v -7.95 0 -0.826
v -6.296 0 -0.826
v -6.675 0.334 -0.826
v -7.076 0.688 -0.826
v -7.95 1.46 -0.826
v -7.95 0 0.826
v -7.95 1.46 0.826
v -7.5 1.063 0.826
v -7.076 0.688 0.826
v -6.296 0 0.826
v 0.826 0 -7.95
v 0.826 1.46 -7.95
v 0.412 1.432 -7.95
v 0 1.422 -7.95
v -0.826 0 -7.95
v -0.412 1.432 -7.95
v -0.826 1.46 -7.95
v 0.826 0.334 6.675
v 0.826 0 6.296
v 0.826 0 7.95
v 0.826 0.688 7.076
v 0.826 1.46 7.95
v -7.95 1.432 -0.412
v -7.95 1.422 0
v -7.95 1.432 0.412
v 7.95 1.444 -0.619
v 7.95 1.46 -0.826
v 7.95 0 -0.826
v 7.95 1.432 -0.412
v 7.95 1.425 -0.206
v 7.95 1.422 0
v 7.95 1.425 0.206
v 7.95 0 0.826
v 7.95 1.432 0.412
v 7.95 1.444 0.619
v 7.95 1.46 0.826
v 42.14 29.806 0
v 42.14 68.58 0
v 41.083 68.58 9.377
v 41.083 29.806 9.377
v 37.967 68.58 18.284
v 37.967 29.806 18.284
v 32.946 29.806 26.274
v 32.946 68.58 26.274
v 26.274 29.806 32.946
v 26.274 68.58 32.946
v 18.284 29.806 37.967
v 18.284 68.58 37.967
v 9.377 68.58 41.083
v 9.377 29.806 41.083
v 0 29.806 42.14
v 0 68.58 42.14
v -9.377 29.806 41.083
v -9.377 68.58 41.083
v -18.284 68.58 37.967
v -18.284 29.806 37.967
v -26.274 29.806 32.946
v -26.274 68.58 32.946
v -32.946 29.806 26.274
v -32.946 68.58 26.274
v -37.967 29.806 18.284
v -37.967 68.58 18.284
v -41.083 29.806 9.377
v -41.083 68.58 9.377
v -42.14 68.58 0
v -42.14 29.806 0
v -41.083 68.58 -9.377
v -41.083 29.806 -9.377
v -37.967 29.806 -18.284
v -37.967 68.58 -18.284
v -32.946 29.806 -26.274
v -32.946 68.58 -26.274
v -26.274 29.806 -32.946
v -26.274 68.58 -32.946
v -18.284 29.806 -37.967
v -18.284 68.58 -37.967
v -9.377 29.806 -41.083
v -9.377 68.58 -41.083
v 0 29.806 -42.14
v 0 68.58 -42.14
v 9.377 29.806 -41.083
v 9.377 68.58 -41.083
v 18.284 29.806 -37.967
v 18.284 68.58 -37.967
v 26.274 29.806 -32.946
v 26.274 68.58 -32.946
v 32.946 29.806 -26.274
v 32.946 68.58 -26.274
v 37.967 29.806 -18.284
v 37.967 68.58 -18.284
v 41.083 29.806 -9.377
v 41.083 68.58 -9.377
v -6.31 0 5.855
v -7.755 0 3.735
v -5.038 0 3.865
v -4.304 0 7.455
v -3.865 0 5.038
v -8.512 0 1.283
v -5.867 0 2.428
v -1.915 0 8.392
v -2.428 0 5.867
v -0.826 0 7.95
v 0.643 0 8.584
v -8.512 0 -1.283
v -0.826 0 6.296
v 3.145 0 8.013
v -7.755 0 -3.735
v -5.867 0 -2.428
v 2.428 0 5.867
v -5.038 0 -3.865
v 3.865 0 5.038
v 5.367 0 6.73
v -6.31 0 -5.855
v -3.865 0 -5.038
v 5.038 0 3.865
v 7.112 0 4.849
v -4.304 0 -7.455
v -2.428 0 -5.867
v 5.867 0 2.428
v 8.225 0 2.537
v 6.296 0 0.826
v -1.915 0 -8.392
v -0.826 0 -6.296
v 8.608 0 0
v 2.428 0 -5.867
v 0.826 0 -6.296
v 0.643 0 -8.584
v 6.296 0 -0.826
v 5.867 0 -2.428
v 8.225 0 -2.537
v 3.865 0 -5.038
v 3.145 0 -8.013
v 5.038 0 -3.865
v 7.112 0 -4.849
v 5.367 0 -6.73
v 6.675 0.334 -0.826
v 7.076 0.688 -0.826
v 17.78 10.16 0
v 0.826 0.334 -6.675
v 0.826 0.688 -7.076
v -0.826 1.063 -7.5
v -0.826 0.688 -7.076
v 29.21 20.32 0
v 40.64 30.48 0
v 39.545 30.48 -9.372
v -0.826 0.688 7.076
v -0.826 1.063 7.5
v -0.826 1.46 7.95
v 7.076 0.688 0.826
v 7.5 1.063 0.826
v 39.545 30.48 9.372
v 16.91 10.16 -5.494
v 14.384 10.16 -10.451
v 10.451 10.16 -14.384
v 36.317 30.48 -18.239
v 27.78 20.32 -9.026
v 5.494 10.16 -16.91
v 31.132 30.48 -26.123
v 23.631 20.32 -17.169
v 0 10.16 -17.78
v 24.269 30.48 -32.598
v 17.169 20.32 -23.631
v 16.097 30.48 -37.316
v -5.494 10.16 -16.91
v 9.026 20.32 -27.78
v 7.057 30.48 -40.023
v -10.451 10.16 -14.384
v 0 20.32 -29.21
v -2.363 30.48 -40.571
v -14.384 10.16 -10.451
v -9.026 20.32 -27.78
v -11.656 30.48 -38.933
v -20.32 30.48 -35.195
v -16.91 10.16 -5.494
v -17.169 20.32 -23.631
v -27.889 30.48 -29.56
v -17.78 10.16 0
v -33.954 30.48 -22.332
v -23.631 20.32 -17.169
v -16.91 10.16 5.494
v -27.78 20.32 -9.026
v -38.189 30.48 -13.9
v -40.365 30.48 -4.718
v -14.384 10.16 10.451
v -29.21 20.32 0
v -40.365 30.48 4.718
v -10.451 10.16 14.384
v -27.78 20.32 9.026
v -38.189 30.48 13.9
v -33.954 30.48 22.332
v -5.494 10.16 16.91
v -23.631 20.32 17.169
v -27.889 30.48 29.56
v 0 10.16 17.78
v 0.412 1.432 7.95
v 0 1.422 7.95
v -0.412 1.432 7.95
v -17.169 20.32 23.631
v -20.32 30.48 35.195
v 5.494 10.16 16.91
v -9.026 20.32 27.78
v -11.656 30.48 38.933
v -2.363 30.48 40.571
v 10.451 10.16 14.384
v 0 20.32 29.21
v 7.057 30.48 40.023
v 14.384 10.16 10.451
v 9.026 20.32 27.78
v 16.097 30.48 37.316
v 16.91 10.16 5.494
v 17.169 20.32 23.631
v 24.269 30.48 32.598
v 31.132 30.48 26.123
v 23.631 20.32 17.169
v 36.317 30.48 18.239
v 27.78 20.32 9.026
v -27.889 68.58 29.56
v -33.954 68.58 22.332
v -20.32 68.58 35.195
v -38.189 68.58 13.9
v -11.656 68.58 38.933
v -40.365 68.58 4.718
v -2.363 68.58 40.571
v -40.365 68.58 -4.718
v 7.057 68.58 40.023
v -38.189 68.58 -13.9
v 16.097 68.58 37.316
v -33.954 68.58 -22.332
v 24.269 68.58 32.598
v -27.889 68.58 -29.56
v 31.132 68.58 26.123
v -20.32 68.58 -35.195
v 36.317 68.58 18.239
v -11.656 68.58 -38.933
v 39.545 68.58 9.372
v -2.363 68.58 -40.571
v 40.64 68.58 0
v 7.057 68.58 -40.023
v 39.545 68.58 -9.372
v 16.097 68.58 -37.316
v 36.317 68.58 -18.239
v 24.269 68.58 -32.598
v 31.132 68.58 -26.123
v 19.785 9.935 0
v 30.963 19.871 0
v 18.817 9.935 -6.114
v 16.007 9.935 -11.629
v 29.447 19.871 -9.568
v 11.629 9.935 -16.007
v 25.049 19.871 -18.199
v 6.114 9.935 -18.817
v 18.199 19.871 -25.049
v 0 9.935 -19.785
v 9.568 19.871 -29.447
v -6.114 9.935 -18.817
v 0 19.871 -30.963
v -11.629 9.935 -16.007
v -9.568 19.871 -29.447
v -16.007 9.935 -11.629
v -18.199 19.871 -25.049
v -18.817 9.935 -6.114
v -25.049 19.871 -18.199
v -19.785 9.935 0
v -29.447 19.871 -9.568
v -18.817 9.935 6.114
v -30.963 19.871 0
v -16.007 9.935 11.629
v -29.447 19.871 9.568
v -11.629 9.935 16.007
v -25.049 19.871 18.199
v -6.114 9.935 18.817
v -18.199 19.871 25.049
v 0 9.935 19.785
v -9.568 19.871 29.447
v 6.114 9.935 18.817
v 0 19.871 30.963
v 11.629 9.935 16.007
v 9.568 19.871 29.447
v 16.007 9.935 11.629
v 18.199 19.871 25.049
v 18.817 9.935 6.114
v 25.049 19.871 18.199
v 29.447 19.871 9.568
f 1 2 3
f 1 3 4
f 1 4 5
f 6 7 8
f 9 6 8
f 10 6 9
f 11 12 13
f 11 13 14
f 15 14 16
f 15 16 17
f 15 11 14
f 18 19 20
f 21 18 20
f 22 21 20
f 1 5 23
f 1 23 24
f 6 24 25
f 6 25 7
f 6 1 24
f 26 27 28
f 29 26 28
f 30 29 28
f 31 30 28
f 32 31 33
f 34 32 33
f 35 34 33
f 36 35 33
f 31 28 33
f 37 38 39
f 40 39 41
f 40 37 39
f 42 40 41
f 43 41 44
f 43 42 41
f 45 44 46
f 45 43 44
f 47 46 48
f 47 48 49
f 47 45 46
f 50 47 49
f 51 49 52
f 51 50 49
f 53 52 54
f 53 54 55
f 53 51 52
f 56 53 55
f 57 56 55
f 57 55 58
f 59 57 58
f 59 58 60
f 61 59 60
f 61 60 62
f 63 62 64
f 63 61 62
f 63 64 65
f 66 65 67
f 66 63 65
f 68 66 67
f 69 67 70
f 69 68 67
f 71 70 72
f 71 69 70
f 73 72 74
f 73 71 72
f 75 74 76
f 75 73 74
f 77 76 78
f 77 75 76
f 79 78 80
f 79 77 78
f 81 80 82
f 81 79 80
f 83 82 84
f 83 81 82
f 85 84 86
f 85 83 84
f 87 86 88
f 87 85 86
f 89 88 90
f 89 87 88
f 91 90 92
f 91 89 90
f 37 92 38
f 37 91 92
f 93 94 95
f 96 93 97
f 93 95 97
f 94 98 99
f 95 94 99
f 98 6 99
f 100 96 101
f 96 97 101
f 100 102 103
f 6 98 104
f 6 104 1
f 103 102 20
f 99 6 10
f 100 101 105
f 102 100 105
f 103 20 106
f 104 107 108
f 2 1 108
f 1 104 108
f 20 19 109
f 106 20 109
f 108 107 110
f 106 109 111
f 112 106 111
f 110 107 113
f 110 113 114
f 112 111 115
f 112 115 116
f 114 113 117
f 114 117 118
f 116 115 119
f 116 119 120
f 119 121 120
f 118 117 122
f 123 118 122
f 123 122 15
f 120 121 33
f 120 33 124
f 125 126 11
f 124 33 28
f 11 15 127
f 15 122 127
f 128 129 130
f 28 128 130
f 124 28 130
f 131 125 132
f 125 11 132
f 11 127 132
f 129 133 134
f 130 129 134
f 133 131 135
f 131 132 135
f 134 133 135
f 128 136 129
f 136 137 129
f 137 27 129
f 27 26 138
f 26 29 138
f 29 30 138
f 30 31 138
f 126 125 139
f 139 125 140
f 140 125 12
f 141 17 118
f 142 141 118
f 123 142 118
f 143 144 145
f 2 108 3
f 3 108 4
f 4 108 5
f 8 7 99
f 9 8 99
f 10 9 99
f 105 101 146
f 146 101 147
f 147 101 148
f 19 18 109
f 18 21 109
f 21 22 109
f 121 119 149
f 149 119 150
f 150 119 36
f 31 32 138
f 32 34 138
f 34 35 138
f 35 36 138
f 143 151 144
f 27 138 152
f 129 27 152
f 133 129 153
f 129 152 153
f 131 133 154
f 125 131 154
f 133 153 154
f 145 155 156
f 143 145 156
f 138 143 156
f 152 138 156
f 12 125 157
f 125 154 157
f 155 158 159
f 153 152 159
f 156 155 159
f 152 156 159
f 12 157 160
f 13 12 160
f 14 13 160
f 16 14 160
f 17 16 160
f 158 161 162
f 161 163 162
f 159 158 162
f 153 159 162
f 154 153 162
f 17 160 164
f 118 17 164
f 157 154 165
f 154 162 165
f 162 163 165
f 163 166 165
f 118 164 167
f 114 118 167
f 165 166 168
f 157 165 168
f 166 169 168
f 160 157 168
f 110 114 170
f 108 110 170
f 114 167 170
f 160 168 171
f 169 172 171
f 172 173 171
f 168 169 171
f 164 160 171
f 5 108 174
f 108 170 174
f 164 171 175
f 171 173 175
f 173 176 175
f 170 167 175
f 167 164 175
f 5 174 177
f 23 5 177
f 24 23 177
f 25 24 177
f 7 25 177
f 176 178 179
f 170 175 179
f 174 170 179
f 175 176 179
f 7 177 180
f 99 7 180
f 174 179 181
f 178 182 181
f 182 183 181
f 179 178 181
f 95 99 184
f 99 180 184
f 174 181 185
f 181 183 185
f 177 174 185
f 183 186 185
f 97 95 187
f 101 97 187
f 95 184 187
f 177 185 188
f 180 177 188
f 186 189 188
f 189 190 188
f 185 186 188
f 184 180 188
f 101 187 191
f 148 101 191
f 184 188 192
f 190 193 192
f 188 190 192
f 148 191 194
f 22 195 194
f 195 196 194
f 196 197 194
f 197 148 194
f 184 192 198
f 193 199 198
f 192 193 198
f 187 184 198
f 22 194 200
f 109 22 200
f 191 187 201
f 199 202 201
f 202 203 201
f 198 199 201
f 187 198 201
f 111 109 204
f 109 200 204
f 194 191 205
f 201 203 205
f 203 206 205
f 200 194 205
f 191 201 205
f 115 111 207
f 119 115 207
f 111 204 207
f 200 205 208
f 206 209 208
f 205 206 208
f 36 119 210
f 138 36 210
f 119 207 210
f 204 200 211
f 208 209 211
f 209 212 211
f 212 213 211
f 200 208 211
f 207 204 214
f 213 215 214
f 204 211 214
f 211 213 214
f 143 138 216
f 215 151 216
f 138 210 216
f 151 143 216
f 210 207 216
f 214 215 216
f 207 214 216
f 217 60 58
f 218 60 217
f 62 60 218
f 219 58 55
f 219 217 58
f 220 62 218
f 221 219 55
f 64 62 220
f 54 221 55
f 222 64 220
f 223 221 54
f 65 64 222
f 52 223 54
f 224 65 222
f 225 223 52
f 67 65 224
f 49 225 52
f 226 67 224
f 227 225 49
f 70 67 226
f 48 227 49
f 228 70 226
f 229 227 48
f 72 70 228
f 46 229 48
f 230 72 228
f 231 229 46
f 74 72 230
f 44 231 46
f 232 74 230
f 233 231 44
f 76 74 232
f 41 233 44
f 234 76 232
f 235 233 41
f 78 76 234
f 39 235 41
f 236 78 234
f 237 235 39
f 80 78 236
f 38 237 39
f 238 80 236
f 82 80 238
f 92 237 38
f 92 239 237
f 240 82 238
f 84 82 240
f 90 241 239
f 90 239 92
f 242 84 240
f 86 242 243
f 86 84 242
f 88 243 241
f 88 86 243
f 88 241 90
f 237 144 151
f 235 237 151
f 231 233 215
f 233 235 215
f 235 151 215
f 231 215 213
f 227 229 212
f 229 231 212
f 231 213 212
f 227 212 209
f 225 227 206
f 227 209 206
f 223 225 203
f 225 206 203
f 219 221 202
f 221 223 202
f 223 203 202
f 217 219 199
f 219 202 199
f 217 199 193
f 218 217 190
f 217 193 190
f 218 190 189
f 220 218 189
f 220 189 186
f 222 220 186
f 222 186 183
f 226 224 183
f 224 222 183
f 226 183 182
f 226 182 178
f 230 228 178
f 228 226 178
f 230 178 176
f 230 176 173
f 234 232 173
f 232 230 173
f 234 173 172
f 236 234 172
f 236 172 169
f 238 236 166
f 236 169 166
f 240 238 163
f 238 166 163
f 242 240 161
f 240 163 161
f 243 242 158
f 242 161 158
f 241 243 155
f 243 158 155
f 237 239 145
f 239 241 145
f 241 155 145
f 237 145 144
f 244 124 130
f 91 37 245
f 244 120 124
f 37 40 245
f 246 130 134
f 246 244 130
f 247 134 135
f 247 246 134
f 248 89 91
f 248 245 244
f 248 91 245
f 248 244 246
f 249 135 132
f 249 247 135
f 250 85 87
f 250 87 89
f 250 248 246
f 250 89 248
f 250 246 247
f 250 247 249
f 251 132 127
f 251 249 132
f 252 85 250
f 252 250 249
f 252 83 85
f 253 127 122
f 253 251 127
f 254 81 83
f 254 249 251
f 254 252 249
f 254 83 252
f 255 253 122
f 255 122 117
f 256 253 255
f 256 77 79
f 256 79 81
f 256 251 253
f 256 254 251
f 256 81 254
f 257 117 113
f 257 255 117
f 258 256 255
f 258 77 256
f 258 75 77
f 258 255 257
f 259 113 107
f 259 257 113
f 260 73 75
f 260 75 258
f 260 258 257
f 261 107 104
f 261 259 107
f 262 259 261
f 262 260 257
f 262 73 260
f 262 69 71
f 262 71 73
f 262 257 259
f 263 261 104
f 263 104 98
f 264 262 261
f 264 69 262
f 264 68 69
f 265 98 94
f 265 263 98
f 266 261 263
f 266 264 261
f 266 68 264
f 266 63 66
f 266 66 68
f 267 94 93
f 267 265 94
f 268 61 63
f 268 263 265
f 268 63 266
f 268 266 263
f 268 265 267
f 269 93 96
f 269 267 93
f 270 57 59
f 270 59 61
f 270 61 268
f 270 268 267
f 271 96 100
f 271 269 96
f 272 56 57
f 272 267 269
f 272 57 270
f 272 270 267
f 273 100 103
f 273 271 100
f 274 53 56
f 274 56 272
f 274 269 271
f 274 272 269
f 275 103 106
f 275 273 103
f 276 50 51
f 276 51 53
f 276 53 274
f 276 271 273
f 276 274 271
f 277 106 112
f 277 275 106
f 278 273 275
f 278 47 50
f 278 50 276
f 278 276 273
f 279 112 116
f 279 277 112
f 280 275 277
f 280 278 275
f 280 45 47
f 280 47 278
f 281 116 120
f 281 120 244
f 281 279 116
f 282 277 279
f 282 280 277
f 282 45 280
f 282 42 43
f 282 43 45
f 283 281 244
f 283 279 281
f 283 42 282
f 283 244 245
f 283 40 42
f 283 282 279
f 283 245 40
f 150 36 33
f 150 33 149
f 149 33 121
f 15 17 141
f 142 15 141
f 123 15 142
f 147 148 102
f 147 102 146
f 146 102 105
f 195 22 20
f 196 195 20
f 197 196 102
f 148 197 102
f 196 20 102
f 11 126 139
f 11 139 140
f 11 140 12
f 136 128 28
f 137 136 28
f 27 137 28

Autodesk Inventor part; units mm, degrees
ref_plane "YZ Plane" through (0, 0, 0) normal (1, 0, 0) x (0, 1, 0)
ref_plane "XZ Plane" through (0, 0, 0) normal (0, 1, 0) x (-1, 0, 0)
ref_plane "XY Plane" through (0, 0, 0) normal (0, 0, 1) x (1, 0, 0)
sketch "Sketch1" plane through (0, 0, 0) normal (0, 0, 1) x (1, 0, 0)
  line L0 (0, 0) -> (0, 68.58)
  line L1 (0, 68.58) -> (40.64, 68.58)
  line L2 (40.64, 30.48) -> (6.35, 0)
  line L3 (6.35, 0) -> (0, 0)
  line L4 (40.64, 68.58) -> (40.64, 30.48)
  dimension "d1" = 40.64
  dimension "d2" = 6.35
  dimension "d6" = 90
  dimension "d21" = 38.1
  dimension "d22" = 30.48
revolve "Revolution1" add sketch "Sketch1" angle 360 about axis through (0, 0, 0) along (0, 1, 0)
shell "Shell1" thickness 1.5 outward yes removed faces 2 at (-10.0721, 68.58, 13.6928) at (-1.8127, 0, 0.4771)
sketch "Sketch2" plane through (0, 0, 0) normal (0, -1, 0) x (1, 0, 0)
  line L0 (6.2865, -0.8255) -> (7.9502, -0.8255)
  line L1 (7.9502, -0.8255) -> (7.9502, 0.8255)
  line L2 (7.9502, 0.8255) -> (6.2865, 0.8255)
  line L3 (6.2865, 0.8255) -> (6.2865, -0.8255)
  line L4 (6.2865, -0.8255) -> (7.9502, 0.8255) construction
  line L5 (7.9502, -0.8255) -> (6.2865, 0.8255) construction
  line L6 (0, 1.1822) -> (0, -1.5875) construction
  line L7 (-6.2865, -0.8255) -> (-7.9502, -0.8255)
  line L8 (-7.9502, -0.8255) -> (-7.9502, 0.8255)
  line L9 (-7.9502, 0.8255) -> (-6.2865, 0.8255)
  line L10 (-6.2865, 0.8255) -> (-6.2865, -0.8255)
  line L11 (2.1925, 0) -> (-0.3475, 0) construction
  line L12 (-0.8255, 6.2865) -> (0.8255, 6.2865)
  line L13 (0.8255, 6.2865) -> (0.8255, 7.9502)
  line L14 (0.8255, 7.9502) -> (-0.8255, 7.9502)
  line L15 (-0.8255, 7.9502) -> (-0.8255, 6.2865)
  line L16 (-0.8255, 6.2865) -> (0.8255, 7.9502) construction
  line L17 (0.8255, 6.2865) -> (-0.8255, 7.9502) construction
  line L18 (-0.8255, -6.2865) -> (0.8255, -6.2865)
  line L19 (0.8255, -6.2865) -> (0.8255, -7.9502)
  line L20 (0.8255, -7.9502) -> (-0.8255, -7.9502)
  line L21 (-0.8255, -7.9502) -> (-0.8255, -6.2865)
  line L22 (-0.8255, -6.2865) -> (0.8255, -7.9502) construction
  line L23 (0.8255, -6.2865) -> (-0.8255, -7.9502) construction
  circle A0 centre (0, 0) radius 6.35 projected
  point P0 (0, 0)
  point P1 (7.1183, 0)
  point P2 (-7.1183, 0)
  point P3 (0, 7.1183)
  point P4 (0, -7.1183)
  dimension "d8" = 1.651
  dimension "d9" = 1.6637
  dimension "d11" = 1.6637
  dimension "d12" = 1.651
  dimension "d17" = 0.0635
  dimension "d18" = 0.0635
extrude "Extrusion3" cut sketch "Sketch2" against normal blind 1.651 contours L3 L2 A0 L0 | A0 L2 L1 L0 | A0 L21 L18 L19 | L19 L20 L21 A0 | A0 L15 L14 L13 | L13 L12 L15 A0 | A0 L9 L10 L7 | L7 L8 L9 A0
equation "\"BendRadius\" = Thickness"
equation "\"BendReliefWidth\" = Thickness"
equation "\"BendReliefDepth\" = 0.5 * Thickness"
equation "\"CornerReliefSize\" = 4 * Thickness"
equation "\"MinimumRemnant\" = 2 * Thickness"
equation "\"TransitionRadius\" = BendRadius"
equation "\"JacobiRadiusSize\" = BendRadius"
equation "\"GapSize\" = Thickness"
equation "\"Thickness\" = 3.048"
properties part number "LargerWidefieldCone_v3"
